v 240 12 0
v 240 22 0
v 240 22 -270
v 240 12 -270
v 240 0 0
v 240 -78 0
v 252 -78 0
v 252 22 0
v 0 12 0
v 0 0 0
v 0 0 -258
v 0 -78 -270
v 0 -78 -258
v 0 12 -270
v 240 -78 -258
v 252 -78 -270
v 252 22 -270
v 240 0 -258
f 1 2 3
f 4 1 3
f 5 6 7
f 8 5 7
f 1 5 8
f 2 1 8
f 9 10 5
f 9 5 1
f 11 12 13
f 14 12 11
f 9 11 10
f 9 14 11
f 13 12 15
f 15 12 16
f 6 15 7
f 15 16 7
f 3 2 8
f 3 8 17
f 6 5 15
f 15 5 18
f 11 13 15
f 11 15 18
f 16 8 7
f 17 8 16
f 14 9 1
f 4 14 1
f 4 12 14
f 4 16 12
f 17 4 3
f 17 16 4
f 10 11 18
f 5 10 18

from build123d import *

# Parameters (mm, degrees)
SKETCH_2_W      = 240
SKETCH_2_H      = 270
EXTRUDE_1_DEPTH = 12
SKETCH_3_W      = 270
SKETCH_3_H      = 100
EXTRUDE_2_DEPTH = 12
SKETCH_4_W      = 12
SKETCH_4_H      = 78
EXTRUDE_3_DEPTH = 240


with BuildPart() as part:
    # 草图2 → 凸台-拉伸1 (new body)
    with BuildSketch(Plane(origin=(0, 0, 0), x_dir=(1, 0, 0), z_dir=(0, 1, 0))):
        with Locations((120, 135)):
            Rectangle(SKETCH_2_W, SKETCH_2_H)
    extrude(amount=EXTRUDE_1_DEPTH)

    # 草图3 → 凸台-拉伸2 (add)
    with BuildSketch(Plane(origin=(240, 0, 0), x_dir=(0, 0, -1), z_dir=(1, 0, 0))):
        with Locations((135, -28)):
            Rectangle(SKETCH_3_W, SKETCH_3_H)
    extrude(amount=EXTRUDE_2_DEPTH)

    # 草图4 → 凸台-拉伸3 (add)
    with BuildSketch(Plane.ZY.offset(-240)):
        with Locations((-264, -39)):
            Rectangle(SKETCH_4_W, SKETCH_4_H)
    extrude(amount=EXTRUDE_3_DEPTH)


solid = part.part
